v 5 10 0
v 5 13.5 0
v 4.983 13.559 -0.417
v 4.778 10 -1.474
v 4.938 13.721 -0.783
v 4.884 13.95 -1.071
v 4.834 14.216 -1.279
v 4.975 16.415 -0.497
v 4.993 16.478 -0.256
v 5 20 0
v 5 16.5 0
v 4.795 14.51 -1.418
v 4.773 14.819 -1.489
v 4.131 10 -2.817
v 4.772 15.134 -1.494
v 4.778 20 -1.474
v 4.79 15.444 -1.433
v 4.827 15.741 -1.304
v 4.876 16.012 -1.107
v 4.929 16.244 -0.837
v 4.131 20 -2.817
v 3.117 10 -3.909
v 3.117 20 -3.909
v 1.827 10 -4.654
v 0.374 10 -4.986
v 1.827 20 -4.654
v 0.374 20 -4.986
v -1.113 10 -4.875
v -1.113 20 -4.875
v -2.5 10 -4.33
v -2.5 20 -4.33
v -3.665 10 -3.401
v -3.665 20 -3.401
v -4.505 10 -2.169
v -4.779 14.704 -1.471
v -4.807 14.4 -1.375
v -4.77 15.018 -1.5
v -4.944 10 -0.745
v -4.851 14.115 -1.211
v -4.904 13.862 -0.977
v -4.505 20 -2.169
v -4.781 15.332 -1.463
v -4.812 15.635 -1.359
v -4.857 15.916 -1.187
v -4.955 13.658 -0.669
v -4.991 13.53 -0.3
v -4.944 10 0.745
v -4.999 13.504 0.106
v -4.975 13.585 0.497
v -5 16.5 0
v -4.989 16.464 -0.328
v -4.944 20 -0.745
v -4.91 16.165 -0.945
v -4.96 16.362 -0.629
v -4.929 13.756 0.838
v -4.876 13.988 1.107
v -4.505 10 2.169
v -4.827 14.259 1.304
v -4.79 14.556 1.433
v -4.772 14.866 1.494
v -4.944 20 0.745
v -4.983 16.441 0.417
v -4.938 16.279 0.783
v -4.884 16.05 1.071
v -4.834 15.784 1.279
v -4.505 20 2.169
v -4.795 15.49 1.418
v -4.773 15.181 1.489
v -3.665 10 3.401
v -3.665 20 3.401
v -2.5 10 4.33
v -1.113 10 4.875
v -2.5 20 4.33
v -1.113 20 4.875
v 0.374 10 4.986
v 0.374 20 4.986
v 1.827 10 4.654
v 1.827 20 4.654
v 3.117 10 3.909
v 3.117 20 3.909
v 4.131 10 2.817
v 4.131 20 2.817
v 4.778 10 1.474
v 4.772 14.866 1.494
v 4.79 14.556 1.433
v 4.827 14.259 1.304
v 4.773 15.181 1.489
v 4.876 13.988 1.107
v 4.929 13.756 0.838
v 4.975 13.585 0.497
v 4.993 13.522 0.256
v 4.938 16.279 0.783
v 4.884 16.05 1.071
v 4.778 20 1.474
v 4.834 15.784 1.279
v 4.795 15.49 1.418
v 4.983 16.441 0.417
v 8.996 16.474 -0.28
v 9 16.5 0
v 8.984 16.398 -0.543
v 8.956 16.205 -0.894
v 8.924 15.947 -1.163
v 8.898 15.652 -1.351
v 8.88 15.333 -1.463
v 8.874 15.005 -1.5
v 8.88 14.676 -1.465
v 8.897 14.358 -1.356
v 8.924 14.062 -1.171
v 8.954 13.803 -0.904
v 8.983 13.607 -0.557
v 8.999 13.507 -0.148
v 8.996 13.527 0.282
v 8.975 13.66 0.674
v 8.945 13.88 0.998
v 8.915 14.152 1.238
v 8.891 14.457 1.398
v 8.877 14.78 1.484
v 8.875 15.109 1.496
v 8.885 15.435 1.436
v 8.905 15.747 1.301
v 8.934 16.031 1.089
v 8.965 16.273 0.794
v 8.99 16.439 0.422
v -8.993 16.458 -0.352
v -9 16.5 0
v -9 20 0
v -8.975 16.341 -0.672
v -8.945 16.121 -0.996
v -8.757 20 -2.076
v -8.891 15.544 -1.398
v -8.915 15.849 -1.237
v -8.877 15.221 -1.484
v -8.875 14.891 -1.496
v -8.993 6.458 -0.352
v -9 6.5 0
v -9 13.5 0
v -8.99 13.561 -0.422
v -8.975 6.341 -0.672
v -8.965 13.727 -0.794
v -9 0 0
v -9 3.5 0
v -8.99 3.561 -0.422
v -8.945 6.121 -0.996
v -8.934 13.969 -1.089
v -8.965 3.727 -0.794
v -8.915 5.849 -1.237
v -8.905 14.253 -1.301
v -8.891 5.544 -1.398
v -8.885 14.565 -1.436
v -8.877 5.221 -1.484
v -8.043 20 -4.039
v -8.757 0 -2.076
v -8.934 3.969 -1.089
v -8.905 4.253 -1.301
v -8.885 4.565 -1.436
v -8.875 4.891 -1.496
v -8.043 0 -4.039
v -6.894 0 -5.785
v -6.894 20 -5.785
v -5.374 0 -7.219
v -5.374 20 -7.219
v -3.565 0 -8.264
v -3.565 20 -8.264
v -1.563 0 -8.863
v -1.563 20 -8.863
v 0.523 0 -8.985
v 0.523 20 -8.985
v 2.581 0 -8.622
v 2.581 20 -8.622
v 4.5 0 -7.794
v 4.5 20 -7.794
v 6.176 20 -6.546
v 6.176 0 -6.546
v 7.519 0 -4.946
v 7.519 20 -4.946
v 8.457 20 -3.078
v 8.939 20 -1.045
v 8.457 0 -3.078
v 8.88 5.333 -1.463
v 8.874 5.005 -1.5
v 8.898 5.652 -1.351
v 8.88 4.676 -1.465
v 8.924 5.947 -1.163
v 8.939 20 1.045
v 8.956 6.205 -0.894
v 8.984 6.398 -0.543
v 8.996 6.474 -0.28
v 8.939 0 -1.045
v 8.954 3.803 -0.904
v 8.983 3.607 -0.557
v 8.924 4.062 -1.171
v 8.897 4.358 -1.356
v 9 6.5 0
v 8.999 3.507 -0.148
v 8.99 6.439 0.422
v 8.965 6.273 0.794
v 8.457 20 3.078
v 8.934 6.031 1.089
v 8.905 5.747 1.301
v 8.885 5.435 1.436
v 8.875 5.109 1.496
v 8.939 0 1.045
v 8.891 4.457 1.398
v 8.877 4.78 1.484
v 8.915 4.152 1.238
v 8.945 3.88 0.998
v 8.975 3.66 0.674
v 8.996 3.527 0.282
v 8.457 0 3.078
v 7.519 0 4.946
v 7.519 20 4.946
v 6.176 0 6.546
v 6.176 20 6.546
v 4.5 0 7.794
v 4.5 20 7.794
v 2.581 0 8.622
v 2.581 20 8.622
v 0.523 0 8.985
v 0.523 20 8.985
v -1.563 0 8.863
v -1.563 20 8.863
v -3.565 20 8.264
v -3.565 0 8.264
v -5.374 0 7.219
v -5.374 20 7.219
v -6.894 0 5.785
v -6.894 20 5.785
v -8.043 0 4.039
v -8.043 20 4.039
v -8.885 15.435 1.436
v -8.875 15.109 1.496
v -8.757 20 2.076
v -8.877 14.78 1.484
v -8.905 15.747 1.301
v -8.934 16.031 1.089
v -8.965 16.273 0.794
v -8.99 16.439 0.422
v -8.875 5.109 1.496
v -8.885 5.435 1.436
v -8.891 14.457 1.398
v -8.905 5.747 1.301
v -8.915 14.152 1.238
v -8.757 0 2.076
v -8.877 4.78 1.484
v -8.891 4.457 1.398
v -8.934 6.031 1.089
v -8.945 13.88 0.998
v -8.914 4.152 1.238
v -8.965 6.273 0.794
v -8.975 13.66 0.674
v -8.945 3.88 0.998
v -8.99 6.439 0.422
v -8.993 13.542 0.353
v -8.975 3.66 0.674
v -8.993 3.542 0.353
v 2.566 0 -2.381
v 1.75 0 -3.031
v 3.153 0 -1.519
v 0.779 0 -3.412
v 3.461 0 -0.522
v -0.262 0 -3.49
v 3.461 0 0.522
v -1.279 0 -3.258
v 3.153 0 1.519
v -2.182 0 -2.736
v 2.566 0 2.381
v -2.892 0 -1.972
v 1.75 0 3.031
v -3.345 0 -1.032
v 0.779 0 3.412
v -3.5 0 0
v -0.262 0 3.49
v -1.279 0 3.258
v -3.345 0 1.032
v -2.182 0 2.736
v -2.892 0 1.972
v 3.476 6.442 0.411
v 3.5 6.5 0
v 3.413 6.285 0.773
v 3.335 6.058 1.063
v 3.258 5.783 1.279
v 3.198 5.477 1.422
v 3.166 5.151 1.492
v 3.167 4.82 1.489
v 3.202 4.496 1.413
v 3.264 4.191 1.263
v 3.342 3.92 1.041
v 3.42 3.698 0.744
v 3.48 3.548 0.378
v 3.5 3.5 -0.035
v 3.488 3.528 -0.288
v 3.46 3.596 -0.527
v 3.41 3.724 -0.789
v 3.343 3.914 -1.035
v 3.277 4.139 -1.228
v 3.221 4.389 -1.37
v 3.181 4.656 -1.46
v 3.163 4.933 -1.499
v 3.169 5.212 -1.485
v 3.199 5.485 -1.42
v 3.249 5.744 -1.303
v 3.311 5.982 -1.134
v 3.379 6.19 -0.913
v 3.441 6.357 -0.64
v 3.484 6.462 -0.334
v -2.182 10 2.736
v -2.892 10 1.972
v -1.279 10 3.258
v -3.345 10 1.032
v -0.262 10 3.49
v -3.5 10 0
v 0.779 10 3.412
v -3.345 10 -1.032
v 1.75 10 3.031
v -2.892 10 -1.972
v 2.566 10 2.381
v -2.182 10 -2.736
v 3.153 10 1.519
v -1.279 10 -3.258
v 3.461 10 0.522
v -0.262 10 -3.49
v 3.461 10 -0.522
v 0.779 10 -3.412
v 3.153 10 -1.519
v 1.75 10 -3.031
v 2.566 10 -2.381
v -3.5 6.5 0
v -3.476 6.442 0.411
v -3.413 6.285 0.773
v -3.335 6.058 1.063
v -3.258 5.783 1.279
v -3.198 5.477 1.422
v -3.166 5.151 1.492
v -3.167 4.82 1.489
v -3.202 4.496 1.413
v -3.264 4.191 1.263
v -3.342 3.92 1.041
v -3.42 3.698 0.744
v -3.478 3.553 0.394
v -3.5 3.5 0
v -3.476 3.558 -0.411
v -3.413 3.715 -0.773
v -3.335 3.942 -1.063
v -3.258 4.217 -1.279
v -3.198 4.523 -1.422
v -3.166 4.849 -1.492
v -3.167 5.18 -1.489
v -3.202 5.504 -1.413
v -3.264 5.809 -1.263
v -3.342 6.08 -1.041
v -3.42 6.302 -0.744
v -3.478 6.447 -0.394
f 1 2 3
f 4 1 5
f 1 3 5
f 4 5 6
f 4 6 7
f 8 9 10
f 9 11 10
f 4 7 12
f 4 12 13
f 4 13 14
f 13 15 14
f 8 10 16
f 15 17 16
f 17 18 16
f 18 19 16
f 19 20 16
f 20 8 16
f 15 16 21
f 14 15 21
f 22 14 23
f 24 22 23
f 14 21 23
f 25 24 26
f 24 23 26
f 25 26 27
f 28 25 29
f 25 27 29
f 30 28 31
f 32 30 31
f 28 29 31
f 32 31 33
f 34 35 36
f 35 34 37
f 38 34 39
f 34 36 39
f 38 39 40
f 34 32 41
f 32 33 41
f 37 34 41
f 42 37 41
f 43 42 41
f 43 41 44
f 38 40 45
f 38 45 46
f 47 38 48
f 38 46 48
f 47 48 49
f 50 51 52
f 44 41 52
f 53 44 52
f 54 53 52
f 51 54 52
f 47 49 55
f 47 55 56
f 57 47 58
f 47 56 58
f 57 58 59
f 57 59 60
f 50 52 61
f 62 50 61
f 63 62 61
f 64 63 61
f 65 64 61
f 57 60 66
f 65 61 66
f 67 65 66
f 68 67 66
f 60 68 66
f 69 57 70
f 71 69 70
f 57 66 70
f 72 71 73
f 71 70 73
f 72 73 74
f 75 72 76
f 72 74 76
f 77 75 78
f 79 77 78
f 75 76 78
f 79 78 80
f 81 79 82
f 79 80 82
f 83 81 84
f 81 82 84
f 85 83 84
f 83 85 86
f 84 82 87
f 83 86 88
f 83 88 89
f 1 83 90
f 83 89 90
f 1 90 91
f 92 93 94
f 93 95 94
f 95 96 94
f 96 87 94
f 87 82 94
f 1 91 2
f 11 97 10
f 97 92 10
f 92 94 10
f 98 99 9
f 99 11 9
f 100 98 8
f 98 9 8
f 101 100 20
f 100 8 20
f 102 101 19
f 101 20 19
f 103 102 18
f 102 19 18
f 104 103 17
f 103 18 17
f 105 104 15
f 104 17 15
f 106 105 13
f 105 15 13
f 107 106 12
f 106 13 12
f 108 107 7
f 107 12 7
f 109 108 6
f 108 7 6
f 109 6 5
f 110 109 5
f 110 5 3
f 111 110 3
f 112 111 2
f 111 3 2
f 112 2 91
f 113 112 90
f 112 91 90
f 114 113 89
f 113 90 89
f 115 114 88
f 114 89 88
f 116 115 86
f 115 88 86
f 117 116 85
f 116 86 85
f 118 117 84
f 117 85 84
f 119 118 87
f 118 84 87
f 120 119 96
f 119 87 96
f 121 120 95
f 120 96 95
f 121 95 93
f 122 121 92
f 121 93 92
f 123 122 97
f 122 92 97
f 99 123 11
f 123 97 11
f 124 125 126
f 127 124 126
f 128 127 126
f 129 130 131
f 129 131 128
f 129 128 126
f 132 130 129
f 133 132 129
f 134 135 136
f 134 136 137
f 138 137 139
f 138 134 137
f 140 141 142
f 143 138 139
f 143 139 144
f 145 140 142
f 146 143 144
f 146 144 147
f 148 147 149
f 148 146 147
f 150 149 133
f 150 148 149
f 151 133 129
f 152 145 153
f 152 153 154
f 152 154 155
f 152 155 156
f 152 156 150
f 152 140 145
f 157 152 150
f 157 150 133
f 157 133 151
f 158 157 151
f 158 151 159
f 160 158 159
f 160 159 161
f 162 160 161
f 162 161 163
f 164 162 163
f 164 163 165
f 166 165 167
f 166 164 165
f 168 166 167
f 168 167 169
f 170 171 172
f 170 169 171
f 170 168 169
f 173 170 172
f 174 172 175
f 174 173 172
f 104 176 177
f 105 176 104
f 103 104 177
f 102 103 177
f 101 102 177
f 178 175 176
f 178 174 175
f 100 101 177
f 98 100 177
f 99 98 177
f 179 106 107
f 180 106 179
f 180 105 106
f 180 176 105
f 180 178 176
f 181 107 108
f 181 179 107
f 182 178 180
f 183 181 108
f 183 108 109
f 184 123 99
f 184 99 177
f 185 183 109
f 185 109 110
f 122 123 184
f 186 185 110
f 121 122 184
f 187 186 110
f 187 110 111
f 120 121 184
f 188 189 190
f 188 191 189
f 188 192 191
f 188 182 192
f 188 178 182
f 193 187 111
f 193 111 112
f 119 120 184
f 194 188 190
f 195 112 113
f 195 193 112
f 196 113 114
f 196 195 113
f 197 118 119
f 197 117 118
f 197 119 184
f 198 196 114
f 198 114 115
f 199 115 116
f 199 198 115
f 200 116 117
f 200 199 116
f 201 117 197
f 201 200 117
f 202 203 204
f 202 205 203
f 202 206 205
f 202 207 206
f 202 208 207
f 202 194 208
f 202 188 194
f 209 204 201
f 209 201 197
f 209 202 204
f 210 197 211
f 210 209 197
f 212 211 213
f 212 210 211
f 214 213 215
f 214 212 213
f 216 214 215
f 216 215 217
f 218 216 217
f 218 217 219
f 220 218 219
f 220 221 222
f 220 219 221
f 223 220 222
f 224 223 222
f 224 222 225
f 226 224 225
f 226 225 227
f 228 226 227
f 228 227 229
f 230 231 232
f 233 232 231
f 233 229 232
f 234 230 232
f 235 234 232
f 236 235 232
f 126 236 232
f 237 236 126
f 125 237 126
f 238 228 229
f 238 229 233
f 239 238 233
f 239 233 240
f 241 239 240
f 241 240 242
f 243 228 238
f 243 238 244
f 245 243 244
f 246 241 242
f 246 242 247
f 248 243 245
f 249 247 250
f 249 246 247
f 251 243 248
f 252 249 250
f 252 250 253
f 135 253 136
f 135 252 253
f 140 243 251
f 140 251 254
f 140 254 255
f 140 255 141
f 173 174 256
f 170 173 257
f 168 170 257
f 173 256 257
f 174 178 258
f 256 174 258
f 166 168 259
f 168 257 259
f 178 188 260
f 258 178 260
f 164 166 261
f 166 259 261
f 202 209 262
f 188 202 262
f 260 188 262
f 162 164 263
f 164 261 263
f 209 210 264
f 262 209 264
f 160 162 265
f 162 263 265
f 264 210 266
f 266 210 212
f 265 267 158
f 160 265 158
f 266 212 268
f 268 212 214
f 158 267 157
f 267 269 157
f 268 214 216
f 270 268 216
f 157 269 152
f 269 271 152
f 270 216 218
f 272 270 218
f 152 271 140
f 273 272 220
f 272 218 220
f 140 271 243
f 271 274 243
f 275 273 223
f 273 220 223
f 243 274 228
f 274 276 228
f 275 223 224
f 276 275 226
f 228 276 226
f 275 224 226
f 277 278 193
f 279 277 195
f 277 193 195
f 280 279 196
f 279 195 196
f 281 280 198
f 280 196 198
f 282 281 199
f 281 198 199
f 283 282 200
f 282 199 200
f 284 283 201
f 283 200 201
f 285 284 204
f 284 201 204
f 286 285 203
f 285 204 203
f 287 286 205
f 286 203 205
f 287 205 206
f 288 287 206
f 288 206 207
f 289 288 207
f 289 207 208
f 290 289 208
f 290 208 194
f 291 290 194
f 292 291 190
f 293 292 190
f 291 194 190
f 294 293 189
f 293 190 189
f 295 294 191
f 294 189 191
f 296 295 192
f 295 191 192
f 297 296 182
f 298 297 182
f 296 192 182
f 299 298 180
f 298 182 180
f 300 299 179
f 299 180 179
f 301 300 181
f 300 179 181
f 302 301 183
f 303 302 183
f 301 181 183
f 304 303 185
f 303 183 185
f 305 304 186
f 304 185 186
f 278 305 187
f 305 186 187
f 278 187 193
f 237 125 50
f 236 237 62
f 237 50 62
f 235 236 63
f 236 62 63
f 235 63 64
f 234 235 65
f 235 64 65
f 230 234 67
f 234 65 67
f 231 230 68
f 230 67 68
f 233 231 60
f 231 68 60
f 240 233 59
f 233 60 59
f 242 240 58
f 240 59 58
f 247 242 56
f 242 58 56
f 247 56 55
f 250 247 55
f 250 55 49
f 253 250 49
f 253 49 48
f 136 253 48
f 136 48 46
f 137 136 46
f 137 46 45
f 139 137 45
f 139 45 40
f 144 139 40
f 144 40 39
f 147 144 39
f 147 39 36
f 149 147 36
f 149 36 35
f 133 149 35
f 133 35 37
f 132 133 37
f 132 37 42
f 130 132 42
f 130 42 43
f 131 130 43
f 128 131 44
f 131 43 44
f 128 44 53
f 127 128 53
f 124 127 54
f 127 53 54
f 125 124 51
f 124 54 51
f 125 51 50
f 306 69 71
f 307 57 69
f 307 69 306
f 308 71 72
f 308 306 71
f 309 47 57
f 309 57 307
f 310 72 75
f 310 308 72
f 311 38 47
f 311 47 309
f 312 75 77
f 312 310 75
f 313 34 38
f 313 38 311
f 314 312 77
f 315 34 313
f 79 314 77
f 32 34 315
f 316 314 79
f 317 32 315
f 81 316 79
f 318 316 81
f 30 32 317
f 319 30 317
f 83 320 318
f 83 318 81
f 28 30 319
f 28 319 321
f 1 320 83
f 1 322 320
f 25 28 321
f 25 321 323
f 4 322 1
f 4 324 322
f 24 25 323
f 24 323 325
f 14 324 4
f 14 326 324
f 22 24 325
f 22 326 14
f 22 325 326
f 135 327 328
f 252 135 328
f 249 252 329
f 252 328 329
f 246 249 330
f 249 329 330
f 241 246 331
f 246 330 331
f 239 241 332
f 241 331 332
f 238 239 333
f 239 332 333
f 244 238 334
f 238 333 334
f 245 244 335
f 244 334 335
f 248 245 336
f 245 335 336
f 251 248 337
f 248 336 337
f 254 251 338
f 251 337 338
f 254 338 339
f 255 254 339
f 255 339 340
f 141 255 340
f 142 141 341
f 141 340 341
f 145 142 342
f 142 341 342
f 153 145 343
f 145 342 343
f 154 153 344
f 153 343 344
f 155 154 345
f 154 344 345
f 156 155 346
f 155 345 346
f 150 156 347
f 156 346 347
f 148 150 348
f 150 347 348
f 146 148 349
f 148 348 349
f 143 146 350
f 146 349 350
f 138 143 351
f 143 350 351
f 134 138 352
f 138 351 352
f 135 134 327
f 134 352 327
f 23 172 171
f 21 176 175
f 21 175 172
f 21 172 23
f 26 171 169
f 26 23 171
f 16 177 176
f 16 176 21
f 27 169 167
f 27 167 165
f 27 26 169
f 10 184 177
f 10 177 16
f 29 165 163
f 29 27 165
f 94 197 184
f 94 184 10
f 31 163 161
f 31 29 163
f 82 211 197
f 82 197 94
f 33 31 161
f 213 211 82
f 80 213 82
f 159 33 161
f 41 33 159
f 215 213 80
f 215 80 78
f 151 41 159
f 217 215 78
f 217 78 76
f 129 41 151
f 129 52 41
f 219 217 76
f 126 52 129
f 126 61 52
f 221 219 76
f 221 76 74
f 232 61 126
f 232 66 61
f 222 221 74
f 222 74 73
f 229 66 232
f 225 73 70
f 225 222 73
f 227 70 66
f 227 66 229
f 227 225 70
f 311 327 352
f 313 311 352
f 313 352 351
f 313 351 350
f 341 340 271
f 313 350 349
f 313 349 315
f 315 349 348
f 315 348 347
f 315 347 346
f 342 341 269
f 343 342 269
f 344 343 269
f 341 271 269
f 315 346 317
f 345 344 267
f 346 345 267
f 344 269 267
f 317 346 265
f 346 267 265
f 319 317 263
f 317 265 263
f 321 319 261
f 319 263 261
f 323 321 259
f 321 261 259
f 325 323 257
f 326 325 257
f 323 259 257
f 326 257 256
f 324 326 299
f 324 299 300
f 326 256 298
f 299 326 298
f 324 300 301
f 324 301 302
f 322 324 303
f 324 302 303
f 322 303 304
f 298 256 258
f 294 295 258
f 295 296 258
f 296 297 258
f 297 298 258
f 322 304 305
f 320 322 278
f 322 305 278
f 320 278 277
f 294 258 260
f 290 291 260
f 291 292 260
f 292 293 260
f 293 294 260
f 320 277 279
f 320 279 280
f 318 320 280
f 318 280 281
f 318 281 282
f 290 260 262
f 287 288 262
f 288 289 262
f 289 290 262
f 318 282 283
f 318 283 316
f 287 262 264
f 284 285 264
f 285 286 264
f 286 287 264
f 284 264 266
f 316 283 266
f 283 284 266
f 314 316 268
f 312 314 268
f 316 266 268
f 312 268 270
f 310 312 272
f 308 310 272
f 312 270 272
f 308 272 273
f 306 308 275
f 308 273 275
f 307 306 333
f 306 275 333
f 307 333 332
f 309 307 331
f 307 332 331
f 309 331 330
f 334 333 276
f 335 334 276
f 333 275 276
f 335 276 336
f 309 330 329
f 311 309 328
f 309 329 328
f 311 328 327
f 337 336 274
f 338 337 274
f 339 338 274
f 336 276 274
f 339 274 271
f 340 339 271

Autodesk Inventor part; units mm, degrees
ref_plane "YZ Plane" through (0, 0, 0) normal (1, 0, 0) x (0, 1, 0)
ref_plane "XZ Plane" through (0, 0, 0) normal (0, 1, 0) x (-1, 0, 0)
ref_plane "XY Plane" through (0, 0, 0) normal (0, 0, 1) x (1, 0, 0)
sketch "Эскиз1" plane through (0, 0, 0) normal (0, 1, 0) x (-1, 0, 0)
  circle A0 centre (0, 0) radius 3.5
  circle A1 centre (0, 0) radius 9
  dimension "d0" = 7
  dimension "d1" = 18
extrude "Выдавливание1" add sketch "Эскиз1" along normal blind 20
sketch "Эскиз2" plane through (0, 20, 0) normal (0, 1, 0) x (1, 0, 0)
  circle A0 centre (0, 0) radius 5
  dimension "d4" = 10
extrude "Выдавливание2" cut sketch "Эскиз2" against normal blind 10
sketch "Эскиз3" plane through (0, 0, 0) normal (1, 0, 0) x (0, 1, 0)
  line L0 (20, -9) -> (20, 9) projected
  line L1 (20, 0) -> (15, 0)
  line L2 (0, 0) -> (5, 0)
  circle A0 centre (15, 0) radius 1.5
  circle A1 centre (5, 0) radius 1.5
  dimension "d7" = 5
  dimension "d8" = 5
  dimension "d9" = 3
  dimension "d10" = 3
extrude "Выдавливание3" cut sketch "Эскиз3" along normal mid plane 27.5
thread "Резьба1" size "M3x0.5" class "6H" standard "ISO Metric profile" full length
thread "Резьба2" size "M3x0.5" class "6H" standard "ISO Metric profile" full length
sketch "Эскиз4" plane through (0, 0, 0) normal (0, 0, 1) x (1, 0, 0)
  line L0 (3.5, 10) -> (3.5, 0) projected
  line L1 (-5, 10) -> (5, 10) projected
  line L2 (-3.5, 10) -> (-3.5, 0) projected
  line L3 (-9, 6.5) -> (-3.5, 6.5) projected
  line L4 (-9, 3.5) -> (-3.5, 3.5) projected
  line L5 (3.5, 3.5) -> (9, 3.5) projected
  line L6 (3.5, 6.5) -> (9, 6.5) projected
  line L7 (-3.5, 5) -> (3.5, 5)
  line L8 (0, 5) -> (0, 0)
properties part number "Втулка энкодер"
